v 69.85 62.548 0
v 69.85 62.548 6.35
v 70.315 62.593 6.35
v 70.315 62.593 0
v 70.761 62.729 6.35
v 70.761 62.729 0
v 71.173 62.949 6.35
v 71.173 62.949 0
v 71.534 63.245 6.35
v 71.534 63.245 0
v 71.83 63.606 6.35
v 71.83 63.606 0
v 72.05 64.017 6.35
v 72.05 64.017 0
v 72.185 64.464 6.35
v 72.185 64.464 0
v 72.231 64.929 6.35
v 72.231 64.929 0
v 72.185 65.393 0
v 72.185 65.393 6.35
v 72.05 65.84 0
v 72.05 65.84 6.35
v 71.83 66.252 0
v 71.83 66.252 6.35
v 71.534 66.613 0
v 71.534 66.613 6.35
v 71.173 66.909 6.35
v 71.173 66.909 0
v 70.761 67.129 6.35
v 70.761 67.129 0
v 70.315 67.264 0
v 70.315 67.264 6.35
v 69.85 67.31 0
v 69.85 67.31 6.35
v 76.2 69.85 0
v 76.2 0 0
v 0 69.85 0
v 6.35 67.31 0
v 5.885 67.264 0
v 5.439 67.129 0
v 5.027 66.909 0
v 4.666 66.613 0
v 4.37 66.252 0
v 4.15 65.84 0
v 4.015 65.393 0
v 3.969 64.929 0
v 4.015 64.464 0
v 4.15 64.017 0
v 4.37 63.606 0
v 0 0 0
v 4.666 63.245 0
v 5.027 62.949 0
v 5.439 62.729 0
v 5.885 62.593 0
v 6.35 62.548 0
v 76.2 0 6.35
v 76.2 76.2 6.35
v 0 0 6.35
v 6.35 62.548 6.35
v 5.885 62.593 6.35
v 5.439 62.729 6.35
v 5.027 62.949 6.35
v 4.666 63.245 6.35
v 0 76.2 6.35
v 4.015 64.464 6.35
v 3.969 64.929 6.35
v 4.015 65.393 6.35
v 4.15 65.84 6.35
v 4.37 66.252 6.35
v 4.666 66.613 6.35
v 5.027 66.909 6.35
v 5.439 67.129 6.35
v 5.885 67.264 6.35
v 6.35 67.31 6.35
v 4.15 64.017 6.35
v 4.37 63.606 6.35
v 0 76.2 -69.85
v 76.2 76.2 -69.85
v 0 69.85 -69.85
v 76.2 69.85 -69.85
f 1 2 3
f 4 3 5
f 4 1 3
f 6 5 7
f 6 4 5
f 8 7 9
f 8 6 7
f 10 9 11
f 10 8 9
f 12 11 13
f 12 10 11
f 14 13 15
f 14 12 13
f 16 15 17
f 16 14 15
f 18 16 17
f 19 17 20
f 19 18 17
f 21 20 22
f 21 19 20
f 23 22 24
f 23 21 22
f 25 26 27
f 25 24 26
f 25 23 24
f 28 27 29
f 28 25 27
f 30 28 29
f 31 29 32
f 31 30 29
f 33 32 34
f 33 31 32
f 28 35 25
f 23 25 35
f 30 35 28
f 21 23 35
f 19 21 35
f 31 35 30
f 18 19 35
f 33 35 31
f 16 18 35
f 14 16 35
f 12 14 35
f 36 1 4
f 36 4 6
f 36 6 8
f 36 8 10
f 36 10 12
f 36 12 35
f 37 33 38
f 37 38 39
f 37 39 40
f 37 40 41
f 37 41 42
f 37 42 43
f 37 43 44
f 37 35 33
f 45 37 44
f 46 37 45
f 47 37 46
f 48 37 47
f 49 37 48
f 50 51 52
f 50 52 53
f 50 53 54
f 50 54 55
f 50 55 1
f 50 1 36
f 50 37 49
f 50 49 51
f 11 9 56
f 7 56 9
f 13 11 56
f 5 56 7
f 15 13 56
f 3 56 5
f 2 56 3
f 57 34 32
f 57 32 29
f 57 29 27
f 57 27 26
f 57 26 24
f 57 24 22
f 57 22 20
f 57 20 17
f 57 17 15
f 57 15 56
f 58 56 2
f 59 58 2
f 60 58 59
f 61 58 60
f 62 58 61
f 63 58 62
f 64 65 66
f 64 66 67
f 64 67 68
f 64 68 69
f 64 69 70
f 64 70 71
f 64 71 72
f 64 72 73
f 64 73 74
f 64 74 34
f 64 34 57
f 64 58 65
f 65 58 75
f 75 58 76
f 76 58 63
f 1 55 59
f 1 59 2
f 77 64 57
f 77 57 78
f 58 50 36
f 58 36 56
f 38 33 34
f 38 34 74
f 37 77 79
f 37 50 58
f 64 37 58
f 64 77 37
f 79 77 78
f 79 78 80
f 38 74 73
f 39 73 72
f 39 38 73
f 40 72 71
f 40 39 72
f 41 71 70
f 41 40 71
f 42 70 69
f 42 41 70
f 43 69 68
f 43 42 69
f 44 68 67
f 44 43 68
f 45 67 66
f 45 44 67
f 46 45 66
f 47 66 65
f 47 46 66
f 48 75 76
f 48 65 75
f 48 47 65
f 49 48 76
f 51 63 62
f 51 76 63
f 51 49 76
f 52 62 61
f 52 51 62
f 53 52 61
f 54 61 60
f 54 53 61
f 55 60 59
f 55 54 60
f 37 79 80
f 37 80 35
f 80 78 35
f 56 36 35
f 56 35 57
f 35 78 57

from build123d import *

# Parameters (mm, degrees)
BOSS_EXTRUDE1_DEPTH = 76.2
CUT_EXTRUDE3_DEPTH  = 129.420802443


with BuildPart() as part:
    # Sketch1 → Boss-Extrude1 (new body)
    with BuildSketch(Plane(origin=(0, 0, 0), x_dir=(0, 0, -1), z_dir=(1, 0, 0))):
        Polygon((-6.35, 76.2), (69.85, 76.2), (69.85, 69.85), (0, 69.85), (0, 0), (-6.35, 0), align=None)
    extrude(amount=BOSS_EXTRUDE1_DEPTH)

    # Sketch7 → Cut-Extrude3 (cut, through all)
    with BuildSketch(Plane(origin=(0, 0, 0), x_dir=(-1, 0, 0), z_dir=(0, 0, -1))):
        with BuildLine():
            Line((-69.85, 67.31), (-6.35, 67.31))
            ThreePointArc((-6.35, 67.31), (-3.96875, 64.92875), (-6.35, 62.5475))
            Line((-6.35, 62.5475), (-69.85, 62.5475))
            ThreePointArc((-69.85, 62.5475), (-72.23125, 64.92875), (-69.85, 67.31))
        make_face()
    extrude(amount=-CUT_EXTRUDE3_DEPTH, mode=Mode.SUBTRACT)


solid = part.part
